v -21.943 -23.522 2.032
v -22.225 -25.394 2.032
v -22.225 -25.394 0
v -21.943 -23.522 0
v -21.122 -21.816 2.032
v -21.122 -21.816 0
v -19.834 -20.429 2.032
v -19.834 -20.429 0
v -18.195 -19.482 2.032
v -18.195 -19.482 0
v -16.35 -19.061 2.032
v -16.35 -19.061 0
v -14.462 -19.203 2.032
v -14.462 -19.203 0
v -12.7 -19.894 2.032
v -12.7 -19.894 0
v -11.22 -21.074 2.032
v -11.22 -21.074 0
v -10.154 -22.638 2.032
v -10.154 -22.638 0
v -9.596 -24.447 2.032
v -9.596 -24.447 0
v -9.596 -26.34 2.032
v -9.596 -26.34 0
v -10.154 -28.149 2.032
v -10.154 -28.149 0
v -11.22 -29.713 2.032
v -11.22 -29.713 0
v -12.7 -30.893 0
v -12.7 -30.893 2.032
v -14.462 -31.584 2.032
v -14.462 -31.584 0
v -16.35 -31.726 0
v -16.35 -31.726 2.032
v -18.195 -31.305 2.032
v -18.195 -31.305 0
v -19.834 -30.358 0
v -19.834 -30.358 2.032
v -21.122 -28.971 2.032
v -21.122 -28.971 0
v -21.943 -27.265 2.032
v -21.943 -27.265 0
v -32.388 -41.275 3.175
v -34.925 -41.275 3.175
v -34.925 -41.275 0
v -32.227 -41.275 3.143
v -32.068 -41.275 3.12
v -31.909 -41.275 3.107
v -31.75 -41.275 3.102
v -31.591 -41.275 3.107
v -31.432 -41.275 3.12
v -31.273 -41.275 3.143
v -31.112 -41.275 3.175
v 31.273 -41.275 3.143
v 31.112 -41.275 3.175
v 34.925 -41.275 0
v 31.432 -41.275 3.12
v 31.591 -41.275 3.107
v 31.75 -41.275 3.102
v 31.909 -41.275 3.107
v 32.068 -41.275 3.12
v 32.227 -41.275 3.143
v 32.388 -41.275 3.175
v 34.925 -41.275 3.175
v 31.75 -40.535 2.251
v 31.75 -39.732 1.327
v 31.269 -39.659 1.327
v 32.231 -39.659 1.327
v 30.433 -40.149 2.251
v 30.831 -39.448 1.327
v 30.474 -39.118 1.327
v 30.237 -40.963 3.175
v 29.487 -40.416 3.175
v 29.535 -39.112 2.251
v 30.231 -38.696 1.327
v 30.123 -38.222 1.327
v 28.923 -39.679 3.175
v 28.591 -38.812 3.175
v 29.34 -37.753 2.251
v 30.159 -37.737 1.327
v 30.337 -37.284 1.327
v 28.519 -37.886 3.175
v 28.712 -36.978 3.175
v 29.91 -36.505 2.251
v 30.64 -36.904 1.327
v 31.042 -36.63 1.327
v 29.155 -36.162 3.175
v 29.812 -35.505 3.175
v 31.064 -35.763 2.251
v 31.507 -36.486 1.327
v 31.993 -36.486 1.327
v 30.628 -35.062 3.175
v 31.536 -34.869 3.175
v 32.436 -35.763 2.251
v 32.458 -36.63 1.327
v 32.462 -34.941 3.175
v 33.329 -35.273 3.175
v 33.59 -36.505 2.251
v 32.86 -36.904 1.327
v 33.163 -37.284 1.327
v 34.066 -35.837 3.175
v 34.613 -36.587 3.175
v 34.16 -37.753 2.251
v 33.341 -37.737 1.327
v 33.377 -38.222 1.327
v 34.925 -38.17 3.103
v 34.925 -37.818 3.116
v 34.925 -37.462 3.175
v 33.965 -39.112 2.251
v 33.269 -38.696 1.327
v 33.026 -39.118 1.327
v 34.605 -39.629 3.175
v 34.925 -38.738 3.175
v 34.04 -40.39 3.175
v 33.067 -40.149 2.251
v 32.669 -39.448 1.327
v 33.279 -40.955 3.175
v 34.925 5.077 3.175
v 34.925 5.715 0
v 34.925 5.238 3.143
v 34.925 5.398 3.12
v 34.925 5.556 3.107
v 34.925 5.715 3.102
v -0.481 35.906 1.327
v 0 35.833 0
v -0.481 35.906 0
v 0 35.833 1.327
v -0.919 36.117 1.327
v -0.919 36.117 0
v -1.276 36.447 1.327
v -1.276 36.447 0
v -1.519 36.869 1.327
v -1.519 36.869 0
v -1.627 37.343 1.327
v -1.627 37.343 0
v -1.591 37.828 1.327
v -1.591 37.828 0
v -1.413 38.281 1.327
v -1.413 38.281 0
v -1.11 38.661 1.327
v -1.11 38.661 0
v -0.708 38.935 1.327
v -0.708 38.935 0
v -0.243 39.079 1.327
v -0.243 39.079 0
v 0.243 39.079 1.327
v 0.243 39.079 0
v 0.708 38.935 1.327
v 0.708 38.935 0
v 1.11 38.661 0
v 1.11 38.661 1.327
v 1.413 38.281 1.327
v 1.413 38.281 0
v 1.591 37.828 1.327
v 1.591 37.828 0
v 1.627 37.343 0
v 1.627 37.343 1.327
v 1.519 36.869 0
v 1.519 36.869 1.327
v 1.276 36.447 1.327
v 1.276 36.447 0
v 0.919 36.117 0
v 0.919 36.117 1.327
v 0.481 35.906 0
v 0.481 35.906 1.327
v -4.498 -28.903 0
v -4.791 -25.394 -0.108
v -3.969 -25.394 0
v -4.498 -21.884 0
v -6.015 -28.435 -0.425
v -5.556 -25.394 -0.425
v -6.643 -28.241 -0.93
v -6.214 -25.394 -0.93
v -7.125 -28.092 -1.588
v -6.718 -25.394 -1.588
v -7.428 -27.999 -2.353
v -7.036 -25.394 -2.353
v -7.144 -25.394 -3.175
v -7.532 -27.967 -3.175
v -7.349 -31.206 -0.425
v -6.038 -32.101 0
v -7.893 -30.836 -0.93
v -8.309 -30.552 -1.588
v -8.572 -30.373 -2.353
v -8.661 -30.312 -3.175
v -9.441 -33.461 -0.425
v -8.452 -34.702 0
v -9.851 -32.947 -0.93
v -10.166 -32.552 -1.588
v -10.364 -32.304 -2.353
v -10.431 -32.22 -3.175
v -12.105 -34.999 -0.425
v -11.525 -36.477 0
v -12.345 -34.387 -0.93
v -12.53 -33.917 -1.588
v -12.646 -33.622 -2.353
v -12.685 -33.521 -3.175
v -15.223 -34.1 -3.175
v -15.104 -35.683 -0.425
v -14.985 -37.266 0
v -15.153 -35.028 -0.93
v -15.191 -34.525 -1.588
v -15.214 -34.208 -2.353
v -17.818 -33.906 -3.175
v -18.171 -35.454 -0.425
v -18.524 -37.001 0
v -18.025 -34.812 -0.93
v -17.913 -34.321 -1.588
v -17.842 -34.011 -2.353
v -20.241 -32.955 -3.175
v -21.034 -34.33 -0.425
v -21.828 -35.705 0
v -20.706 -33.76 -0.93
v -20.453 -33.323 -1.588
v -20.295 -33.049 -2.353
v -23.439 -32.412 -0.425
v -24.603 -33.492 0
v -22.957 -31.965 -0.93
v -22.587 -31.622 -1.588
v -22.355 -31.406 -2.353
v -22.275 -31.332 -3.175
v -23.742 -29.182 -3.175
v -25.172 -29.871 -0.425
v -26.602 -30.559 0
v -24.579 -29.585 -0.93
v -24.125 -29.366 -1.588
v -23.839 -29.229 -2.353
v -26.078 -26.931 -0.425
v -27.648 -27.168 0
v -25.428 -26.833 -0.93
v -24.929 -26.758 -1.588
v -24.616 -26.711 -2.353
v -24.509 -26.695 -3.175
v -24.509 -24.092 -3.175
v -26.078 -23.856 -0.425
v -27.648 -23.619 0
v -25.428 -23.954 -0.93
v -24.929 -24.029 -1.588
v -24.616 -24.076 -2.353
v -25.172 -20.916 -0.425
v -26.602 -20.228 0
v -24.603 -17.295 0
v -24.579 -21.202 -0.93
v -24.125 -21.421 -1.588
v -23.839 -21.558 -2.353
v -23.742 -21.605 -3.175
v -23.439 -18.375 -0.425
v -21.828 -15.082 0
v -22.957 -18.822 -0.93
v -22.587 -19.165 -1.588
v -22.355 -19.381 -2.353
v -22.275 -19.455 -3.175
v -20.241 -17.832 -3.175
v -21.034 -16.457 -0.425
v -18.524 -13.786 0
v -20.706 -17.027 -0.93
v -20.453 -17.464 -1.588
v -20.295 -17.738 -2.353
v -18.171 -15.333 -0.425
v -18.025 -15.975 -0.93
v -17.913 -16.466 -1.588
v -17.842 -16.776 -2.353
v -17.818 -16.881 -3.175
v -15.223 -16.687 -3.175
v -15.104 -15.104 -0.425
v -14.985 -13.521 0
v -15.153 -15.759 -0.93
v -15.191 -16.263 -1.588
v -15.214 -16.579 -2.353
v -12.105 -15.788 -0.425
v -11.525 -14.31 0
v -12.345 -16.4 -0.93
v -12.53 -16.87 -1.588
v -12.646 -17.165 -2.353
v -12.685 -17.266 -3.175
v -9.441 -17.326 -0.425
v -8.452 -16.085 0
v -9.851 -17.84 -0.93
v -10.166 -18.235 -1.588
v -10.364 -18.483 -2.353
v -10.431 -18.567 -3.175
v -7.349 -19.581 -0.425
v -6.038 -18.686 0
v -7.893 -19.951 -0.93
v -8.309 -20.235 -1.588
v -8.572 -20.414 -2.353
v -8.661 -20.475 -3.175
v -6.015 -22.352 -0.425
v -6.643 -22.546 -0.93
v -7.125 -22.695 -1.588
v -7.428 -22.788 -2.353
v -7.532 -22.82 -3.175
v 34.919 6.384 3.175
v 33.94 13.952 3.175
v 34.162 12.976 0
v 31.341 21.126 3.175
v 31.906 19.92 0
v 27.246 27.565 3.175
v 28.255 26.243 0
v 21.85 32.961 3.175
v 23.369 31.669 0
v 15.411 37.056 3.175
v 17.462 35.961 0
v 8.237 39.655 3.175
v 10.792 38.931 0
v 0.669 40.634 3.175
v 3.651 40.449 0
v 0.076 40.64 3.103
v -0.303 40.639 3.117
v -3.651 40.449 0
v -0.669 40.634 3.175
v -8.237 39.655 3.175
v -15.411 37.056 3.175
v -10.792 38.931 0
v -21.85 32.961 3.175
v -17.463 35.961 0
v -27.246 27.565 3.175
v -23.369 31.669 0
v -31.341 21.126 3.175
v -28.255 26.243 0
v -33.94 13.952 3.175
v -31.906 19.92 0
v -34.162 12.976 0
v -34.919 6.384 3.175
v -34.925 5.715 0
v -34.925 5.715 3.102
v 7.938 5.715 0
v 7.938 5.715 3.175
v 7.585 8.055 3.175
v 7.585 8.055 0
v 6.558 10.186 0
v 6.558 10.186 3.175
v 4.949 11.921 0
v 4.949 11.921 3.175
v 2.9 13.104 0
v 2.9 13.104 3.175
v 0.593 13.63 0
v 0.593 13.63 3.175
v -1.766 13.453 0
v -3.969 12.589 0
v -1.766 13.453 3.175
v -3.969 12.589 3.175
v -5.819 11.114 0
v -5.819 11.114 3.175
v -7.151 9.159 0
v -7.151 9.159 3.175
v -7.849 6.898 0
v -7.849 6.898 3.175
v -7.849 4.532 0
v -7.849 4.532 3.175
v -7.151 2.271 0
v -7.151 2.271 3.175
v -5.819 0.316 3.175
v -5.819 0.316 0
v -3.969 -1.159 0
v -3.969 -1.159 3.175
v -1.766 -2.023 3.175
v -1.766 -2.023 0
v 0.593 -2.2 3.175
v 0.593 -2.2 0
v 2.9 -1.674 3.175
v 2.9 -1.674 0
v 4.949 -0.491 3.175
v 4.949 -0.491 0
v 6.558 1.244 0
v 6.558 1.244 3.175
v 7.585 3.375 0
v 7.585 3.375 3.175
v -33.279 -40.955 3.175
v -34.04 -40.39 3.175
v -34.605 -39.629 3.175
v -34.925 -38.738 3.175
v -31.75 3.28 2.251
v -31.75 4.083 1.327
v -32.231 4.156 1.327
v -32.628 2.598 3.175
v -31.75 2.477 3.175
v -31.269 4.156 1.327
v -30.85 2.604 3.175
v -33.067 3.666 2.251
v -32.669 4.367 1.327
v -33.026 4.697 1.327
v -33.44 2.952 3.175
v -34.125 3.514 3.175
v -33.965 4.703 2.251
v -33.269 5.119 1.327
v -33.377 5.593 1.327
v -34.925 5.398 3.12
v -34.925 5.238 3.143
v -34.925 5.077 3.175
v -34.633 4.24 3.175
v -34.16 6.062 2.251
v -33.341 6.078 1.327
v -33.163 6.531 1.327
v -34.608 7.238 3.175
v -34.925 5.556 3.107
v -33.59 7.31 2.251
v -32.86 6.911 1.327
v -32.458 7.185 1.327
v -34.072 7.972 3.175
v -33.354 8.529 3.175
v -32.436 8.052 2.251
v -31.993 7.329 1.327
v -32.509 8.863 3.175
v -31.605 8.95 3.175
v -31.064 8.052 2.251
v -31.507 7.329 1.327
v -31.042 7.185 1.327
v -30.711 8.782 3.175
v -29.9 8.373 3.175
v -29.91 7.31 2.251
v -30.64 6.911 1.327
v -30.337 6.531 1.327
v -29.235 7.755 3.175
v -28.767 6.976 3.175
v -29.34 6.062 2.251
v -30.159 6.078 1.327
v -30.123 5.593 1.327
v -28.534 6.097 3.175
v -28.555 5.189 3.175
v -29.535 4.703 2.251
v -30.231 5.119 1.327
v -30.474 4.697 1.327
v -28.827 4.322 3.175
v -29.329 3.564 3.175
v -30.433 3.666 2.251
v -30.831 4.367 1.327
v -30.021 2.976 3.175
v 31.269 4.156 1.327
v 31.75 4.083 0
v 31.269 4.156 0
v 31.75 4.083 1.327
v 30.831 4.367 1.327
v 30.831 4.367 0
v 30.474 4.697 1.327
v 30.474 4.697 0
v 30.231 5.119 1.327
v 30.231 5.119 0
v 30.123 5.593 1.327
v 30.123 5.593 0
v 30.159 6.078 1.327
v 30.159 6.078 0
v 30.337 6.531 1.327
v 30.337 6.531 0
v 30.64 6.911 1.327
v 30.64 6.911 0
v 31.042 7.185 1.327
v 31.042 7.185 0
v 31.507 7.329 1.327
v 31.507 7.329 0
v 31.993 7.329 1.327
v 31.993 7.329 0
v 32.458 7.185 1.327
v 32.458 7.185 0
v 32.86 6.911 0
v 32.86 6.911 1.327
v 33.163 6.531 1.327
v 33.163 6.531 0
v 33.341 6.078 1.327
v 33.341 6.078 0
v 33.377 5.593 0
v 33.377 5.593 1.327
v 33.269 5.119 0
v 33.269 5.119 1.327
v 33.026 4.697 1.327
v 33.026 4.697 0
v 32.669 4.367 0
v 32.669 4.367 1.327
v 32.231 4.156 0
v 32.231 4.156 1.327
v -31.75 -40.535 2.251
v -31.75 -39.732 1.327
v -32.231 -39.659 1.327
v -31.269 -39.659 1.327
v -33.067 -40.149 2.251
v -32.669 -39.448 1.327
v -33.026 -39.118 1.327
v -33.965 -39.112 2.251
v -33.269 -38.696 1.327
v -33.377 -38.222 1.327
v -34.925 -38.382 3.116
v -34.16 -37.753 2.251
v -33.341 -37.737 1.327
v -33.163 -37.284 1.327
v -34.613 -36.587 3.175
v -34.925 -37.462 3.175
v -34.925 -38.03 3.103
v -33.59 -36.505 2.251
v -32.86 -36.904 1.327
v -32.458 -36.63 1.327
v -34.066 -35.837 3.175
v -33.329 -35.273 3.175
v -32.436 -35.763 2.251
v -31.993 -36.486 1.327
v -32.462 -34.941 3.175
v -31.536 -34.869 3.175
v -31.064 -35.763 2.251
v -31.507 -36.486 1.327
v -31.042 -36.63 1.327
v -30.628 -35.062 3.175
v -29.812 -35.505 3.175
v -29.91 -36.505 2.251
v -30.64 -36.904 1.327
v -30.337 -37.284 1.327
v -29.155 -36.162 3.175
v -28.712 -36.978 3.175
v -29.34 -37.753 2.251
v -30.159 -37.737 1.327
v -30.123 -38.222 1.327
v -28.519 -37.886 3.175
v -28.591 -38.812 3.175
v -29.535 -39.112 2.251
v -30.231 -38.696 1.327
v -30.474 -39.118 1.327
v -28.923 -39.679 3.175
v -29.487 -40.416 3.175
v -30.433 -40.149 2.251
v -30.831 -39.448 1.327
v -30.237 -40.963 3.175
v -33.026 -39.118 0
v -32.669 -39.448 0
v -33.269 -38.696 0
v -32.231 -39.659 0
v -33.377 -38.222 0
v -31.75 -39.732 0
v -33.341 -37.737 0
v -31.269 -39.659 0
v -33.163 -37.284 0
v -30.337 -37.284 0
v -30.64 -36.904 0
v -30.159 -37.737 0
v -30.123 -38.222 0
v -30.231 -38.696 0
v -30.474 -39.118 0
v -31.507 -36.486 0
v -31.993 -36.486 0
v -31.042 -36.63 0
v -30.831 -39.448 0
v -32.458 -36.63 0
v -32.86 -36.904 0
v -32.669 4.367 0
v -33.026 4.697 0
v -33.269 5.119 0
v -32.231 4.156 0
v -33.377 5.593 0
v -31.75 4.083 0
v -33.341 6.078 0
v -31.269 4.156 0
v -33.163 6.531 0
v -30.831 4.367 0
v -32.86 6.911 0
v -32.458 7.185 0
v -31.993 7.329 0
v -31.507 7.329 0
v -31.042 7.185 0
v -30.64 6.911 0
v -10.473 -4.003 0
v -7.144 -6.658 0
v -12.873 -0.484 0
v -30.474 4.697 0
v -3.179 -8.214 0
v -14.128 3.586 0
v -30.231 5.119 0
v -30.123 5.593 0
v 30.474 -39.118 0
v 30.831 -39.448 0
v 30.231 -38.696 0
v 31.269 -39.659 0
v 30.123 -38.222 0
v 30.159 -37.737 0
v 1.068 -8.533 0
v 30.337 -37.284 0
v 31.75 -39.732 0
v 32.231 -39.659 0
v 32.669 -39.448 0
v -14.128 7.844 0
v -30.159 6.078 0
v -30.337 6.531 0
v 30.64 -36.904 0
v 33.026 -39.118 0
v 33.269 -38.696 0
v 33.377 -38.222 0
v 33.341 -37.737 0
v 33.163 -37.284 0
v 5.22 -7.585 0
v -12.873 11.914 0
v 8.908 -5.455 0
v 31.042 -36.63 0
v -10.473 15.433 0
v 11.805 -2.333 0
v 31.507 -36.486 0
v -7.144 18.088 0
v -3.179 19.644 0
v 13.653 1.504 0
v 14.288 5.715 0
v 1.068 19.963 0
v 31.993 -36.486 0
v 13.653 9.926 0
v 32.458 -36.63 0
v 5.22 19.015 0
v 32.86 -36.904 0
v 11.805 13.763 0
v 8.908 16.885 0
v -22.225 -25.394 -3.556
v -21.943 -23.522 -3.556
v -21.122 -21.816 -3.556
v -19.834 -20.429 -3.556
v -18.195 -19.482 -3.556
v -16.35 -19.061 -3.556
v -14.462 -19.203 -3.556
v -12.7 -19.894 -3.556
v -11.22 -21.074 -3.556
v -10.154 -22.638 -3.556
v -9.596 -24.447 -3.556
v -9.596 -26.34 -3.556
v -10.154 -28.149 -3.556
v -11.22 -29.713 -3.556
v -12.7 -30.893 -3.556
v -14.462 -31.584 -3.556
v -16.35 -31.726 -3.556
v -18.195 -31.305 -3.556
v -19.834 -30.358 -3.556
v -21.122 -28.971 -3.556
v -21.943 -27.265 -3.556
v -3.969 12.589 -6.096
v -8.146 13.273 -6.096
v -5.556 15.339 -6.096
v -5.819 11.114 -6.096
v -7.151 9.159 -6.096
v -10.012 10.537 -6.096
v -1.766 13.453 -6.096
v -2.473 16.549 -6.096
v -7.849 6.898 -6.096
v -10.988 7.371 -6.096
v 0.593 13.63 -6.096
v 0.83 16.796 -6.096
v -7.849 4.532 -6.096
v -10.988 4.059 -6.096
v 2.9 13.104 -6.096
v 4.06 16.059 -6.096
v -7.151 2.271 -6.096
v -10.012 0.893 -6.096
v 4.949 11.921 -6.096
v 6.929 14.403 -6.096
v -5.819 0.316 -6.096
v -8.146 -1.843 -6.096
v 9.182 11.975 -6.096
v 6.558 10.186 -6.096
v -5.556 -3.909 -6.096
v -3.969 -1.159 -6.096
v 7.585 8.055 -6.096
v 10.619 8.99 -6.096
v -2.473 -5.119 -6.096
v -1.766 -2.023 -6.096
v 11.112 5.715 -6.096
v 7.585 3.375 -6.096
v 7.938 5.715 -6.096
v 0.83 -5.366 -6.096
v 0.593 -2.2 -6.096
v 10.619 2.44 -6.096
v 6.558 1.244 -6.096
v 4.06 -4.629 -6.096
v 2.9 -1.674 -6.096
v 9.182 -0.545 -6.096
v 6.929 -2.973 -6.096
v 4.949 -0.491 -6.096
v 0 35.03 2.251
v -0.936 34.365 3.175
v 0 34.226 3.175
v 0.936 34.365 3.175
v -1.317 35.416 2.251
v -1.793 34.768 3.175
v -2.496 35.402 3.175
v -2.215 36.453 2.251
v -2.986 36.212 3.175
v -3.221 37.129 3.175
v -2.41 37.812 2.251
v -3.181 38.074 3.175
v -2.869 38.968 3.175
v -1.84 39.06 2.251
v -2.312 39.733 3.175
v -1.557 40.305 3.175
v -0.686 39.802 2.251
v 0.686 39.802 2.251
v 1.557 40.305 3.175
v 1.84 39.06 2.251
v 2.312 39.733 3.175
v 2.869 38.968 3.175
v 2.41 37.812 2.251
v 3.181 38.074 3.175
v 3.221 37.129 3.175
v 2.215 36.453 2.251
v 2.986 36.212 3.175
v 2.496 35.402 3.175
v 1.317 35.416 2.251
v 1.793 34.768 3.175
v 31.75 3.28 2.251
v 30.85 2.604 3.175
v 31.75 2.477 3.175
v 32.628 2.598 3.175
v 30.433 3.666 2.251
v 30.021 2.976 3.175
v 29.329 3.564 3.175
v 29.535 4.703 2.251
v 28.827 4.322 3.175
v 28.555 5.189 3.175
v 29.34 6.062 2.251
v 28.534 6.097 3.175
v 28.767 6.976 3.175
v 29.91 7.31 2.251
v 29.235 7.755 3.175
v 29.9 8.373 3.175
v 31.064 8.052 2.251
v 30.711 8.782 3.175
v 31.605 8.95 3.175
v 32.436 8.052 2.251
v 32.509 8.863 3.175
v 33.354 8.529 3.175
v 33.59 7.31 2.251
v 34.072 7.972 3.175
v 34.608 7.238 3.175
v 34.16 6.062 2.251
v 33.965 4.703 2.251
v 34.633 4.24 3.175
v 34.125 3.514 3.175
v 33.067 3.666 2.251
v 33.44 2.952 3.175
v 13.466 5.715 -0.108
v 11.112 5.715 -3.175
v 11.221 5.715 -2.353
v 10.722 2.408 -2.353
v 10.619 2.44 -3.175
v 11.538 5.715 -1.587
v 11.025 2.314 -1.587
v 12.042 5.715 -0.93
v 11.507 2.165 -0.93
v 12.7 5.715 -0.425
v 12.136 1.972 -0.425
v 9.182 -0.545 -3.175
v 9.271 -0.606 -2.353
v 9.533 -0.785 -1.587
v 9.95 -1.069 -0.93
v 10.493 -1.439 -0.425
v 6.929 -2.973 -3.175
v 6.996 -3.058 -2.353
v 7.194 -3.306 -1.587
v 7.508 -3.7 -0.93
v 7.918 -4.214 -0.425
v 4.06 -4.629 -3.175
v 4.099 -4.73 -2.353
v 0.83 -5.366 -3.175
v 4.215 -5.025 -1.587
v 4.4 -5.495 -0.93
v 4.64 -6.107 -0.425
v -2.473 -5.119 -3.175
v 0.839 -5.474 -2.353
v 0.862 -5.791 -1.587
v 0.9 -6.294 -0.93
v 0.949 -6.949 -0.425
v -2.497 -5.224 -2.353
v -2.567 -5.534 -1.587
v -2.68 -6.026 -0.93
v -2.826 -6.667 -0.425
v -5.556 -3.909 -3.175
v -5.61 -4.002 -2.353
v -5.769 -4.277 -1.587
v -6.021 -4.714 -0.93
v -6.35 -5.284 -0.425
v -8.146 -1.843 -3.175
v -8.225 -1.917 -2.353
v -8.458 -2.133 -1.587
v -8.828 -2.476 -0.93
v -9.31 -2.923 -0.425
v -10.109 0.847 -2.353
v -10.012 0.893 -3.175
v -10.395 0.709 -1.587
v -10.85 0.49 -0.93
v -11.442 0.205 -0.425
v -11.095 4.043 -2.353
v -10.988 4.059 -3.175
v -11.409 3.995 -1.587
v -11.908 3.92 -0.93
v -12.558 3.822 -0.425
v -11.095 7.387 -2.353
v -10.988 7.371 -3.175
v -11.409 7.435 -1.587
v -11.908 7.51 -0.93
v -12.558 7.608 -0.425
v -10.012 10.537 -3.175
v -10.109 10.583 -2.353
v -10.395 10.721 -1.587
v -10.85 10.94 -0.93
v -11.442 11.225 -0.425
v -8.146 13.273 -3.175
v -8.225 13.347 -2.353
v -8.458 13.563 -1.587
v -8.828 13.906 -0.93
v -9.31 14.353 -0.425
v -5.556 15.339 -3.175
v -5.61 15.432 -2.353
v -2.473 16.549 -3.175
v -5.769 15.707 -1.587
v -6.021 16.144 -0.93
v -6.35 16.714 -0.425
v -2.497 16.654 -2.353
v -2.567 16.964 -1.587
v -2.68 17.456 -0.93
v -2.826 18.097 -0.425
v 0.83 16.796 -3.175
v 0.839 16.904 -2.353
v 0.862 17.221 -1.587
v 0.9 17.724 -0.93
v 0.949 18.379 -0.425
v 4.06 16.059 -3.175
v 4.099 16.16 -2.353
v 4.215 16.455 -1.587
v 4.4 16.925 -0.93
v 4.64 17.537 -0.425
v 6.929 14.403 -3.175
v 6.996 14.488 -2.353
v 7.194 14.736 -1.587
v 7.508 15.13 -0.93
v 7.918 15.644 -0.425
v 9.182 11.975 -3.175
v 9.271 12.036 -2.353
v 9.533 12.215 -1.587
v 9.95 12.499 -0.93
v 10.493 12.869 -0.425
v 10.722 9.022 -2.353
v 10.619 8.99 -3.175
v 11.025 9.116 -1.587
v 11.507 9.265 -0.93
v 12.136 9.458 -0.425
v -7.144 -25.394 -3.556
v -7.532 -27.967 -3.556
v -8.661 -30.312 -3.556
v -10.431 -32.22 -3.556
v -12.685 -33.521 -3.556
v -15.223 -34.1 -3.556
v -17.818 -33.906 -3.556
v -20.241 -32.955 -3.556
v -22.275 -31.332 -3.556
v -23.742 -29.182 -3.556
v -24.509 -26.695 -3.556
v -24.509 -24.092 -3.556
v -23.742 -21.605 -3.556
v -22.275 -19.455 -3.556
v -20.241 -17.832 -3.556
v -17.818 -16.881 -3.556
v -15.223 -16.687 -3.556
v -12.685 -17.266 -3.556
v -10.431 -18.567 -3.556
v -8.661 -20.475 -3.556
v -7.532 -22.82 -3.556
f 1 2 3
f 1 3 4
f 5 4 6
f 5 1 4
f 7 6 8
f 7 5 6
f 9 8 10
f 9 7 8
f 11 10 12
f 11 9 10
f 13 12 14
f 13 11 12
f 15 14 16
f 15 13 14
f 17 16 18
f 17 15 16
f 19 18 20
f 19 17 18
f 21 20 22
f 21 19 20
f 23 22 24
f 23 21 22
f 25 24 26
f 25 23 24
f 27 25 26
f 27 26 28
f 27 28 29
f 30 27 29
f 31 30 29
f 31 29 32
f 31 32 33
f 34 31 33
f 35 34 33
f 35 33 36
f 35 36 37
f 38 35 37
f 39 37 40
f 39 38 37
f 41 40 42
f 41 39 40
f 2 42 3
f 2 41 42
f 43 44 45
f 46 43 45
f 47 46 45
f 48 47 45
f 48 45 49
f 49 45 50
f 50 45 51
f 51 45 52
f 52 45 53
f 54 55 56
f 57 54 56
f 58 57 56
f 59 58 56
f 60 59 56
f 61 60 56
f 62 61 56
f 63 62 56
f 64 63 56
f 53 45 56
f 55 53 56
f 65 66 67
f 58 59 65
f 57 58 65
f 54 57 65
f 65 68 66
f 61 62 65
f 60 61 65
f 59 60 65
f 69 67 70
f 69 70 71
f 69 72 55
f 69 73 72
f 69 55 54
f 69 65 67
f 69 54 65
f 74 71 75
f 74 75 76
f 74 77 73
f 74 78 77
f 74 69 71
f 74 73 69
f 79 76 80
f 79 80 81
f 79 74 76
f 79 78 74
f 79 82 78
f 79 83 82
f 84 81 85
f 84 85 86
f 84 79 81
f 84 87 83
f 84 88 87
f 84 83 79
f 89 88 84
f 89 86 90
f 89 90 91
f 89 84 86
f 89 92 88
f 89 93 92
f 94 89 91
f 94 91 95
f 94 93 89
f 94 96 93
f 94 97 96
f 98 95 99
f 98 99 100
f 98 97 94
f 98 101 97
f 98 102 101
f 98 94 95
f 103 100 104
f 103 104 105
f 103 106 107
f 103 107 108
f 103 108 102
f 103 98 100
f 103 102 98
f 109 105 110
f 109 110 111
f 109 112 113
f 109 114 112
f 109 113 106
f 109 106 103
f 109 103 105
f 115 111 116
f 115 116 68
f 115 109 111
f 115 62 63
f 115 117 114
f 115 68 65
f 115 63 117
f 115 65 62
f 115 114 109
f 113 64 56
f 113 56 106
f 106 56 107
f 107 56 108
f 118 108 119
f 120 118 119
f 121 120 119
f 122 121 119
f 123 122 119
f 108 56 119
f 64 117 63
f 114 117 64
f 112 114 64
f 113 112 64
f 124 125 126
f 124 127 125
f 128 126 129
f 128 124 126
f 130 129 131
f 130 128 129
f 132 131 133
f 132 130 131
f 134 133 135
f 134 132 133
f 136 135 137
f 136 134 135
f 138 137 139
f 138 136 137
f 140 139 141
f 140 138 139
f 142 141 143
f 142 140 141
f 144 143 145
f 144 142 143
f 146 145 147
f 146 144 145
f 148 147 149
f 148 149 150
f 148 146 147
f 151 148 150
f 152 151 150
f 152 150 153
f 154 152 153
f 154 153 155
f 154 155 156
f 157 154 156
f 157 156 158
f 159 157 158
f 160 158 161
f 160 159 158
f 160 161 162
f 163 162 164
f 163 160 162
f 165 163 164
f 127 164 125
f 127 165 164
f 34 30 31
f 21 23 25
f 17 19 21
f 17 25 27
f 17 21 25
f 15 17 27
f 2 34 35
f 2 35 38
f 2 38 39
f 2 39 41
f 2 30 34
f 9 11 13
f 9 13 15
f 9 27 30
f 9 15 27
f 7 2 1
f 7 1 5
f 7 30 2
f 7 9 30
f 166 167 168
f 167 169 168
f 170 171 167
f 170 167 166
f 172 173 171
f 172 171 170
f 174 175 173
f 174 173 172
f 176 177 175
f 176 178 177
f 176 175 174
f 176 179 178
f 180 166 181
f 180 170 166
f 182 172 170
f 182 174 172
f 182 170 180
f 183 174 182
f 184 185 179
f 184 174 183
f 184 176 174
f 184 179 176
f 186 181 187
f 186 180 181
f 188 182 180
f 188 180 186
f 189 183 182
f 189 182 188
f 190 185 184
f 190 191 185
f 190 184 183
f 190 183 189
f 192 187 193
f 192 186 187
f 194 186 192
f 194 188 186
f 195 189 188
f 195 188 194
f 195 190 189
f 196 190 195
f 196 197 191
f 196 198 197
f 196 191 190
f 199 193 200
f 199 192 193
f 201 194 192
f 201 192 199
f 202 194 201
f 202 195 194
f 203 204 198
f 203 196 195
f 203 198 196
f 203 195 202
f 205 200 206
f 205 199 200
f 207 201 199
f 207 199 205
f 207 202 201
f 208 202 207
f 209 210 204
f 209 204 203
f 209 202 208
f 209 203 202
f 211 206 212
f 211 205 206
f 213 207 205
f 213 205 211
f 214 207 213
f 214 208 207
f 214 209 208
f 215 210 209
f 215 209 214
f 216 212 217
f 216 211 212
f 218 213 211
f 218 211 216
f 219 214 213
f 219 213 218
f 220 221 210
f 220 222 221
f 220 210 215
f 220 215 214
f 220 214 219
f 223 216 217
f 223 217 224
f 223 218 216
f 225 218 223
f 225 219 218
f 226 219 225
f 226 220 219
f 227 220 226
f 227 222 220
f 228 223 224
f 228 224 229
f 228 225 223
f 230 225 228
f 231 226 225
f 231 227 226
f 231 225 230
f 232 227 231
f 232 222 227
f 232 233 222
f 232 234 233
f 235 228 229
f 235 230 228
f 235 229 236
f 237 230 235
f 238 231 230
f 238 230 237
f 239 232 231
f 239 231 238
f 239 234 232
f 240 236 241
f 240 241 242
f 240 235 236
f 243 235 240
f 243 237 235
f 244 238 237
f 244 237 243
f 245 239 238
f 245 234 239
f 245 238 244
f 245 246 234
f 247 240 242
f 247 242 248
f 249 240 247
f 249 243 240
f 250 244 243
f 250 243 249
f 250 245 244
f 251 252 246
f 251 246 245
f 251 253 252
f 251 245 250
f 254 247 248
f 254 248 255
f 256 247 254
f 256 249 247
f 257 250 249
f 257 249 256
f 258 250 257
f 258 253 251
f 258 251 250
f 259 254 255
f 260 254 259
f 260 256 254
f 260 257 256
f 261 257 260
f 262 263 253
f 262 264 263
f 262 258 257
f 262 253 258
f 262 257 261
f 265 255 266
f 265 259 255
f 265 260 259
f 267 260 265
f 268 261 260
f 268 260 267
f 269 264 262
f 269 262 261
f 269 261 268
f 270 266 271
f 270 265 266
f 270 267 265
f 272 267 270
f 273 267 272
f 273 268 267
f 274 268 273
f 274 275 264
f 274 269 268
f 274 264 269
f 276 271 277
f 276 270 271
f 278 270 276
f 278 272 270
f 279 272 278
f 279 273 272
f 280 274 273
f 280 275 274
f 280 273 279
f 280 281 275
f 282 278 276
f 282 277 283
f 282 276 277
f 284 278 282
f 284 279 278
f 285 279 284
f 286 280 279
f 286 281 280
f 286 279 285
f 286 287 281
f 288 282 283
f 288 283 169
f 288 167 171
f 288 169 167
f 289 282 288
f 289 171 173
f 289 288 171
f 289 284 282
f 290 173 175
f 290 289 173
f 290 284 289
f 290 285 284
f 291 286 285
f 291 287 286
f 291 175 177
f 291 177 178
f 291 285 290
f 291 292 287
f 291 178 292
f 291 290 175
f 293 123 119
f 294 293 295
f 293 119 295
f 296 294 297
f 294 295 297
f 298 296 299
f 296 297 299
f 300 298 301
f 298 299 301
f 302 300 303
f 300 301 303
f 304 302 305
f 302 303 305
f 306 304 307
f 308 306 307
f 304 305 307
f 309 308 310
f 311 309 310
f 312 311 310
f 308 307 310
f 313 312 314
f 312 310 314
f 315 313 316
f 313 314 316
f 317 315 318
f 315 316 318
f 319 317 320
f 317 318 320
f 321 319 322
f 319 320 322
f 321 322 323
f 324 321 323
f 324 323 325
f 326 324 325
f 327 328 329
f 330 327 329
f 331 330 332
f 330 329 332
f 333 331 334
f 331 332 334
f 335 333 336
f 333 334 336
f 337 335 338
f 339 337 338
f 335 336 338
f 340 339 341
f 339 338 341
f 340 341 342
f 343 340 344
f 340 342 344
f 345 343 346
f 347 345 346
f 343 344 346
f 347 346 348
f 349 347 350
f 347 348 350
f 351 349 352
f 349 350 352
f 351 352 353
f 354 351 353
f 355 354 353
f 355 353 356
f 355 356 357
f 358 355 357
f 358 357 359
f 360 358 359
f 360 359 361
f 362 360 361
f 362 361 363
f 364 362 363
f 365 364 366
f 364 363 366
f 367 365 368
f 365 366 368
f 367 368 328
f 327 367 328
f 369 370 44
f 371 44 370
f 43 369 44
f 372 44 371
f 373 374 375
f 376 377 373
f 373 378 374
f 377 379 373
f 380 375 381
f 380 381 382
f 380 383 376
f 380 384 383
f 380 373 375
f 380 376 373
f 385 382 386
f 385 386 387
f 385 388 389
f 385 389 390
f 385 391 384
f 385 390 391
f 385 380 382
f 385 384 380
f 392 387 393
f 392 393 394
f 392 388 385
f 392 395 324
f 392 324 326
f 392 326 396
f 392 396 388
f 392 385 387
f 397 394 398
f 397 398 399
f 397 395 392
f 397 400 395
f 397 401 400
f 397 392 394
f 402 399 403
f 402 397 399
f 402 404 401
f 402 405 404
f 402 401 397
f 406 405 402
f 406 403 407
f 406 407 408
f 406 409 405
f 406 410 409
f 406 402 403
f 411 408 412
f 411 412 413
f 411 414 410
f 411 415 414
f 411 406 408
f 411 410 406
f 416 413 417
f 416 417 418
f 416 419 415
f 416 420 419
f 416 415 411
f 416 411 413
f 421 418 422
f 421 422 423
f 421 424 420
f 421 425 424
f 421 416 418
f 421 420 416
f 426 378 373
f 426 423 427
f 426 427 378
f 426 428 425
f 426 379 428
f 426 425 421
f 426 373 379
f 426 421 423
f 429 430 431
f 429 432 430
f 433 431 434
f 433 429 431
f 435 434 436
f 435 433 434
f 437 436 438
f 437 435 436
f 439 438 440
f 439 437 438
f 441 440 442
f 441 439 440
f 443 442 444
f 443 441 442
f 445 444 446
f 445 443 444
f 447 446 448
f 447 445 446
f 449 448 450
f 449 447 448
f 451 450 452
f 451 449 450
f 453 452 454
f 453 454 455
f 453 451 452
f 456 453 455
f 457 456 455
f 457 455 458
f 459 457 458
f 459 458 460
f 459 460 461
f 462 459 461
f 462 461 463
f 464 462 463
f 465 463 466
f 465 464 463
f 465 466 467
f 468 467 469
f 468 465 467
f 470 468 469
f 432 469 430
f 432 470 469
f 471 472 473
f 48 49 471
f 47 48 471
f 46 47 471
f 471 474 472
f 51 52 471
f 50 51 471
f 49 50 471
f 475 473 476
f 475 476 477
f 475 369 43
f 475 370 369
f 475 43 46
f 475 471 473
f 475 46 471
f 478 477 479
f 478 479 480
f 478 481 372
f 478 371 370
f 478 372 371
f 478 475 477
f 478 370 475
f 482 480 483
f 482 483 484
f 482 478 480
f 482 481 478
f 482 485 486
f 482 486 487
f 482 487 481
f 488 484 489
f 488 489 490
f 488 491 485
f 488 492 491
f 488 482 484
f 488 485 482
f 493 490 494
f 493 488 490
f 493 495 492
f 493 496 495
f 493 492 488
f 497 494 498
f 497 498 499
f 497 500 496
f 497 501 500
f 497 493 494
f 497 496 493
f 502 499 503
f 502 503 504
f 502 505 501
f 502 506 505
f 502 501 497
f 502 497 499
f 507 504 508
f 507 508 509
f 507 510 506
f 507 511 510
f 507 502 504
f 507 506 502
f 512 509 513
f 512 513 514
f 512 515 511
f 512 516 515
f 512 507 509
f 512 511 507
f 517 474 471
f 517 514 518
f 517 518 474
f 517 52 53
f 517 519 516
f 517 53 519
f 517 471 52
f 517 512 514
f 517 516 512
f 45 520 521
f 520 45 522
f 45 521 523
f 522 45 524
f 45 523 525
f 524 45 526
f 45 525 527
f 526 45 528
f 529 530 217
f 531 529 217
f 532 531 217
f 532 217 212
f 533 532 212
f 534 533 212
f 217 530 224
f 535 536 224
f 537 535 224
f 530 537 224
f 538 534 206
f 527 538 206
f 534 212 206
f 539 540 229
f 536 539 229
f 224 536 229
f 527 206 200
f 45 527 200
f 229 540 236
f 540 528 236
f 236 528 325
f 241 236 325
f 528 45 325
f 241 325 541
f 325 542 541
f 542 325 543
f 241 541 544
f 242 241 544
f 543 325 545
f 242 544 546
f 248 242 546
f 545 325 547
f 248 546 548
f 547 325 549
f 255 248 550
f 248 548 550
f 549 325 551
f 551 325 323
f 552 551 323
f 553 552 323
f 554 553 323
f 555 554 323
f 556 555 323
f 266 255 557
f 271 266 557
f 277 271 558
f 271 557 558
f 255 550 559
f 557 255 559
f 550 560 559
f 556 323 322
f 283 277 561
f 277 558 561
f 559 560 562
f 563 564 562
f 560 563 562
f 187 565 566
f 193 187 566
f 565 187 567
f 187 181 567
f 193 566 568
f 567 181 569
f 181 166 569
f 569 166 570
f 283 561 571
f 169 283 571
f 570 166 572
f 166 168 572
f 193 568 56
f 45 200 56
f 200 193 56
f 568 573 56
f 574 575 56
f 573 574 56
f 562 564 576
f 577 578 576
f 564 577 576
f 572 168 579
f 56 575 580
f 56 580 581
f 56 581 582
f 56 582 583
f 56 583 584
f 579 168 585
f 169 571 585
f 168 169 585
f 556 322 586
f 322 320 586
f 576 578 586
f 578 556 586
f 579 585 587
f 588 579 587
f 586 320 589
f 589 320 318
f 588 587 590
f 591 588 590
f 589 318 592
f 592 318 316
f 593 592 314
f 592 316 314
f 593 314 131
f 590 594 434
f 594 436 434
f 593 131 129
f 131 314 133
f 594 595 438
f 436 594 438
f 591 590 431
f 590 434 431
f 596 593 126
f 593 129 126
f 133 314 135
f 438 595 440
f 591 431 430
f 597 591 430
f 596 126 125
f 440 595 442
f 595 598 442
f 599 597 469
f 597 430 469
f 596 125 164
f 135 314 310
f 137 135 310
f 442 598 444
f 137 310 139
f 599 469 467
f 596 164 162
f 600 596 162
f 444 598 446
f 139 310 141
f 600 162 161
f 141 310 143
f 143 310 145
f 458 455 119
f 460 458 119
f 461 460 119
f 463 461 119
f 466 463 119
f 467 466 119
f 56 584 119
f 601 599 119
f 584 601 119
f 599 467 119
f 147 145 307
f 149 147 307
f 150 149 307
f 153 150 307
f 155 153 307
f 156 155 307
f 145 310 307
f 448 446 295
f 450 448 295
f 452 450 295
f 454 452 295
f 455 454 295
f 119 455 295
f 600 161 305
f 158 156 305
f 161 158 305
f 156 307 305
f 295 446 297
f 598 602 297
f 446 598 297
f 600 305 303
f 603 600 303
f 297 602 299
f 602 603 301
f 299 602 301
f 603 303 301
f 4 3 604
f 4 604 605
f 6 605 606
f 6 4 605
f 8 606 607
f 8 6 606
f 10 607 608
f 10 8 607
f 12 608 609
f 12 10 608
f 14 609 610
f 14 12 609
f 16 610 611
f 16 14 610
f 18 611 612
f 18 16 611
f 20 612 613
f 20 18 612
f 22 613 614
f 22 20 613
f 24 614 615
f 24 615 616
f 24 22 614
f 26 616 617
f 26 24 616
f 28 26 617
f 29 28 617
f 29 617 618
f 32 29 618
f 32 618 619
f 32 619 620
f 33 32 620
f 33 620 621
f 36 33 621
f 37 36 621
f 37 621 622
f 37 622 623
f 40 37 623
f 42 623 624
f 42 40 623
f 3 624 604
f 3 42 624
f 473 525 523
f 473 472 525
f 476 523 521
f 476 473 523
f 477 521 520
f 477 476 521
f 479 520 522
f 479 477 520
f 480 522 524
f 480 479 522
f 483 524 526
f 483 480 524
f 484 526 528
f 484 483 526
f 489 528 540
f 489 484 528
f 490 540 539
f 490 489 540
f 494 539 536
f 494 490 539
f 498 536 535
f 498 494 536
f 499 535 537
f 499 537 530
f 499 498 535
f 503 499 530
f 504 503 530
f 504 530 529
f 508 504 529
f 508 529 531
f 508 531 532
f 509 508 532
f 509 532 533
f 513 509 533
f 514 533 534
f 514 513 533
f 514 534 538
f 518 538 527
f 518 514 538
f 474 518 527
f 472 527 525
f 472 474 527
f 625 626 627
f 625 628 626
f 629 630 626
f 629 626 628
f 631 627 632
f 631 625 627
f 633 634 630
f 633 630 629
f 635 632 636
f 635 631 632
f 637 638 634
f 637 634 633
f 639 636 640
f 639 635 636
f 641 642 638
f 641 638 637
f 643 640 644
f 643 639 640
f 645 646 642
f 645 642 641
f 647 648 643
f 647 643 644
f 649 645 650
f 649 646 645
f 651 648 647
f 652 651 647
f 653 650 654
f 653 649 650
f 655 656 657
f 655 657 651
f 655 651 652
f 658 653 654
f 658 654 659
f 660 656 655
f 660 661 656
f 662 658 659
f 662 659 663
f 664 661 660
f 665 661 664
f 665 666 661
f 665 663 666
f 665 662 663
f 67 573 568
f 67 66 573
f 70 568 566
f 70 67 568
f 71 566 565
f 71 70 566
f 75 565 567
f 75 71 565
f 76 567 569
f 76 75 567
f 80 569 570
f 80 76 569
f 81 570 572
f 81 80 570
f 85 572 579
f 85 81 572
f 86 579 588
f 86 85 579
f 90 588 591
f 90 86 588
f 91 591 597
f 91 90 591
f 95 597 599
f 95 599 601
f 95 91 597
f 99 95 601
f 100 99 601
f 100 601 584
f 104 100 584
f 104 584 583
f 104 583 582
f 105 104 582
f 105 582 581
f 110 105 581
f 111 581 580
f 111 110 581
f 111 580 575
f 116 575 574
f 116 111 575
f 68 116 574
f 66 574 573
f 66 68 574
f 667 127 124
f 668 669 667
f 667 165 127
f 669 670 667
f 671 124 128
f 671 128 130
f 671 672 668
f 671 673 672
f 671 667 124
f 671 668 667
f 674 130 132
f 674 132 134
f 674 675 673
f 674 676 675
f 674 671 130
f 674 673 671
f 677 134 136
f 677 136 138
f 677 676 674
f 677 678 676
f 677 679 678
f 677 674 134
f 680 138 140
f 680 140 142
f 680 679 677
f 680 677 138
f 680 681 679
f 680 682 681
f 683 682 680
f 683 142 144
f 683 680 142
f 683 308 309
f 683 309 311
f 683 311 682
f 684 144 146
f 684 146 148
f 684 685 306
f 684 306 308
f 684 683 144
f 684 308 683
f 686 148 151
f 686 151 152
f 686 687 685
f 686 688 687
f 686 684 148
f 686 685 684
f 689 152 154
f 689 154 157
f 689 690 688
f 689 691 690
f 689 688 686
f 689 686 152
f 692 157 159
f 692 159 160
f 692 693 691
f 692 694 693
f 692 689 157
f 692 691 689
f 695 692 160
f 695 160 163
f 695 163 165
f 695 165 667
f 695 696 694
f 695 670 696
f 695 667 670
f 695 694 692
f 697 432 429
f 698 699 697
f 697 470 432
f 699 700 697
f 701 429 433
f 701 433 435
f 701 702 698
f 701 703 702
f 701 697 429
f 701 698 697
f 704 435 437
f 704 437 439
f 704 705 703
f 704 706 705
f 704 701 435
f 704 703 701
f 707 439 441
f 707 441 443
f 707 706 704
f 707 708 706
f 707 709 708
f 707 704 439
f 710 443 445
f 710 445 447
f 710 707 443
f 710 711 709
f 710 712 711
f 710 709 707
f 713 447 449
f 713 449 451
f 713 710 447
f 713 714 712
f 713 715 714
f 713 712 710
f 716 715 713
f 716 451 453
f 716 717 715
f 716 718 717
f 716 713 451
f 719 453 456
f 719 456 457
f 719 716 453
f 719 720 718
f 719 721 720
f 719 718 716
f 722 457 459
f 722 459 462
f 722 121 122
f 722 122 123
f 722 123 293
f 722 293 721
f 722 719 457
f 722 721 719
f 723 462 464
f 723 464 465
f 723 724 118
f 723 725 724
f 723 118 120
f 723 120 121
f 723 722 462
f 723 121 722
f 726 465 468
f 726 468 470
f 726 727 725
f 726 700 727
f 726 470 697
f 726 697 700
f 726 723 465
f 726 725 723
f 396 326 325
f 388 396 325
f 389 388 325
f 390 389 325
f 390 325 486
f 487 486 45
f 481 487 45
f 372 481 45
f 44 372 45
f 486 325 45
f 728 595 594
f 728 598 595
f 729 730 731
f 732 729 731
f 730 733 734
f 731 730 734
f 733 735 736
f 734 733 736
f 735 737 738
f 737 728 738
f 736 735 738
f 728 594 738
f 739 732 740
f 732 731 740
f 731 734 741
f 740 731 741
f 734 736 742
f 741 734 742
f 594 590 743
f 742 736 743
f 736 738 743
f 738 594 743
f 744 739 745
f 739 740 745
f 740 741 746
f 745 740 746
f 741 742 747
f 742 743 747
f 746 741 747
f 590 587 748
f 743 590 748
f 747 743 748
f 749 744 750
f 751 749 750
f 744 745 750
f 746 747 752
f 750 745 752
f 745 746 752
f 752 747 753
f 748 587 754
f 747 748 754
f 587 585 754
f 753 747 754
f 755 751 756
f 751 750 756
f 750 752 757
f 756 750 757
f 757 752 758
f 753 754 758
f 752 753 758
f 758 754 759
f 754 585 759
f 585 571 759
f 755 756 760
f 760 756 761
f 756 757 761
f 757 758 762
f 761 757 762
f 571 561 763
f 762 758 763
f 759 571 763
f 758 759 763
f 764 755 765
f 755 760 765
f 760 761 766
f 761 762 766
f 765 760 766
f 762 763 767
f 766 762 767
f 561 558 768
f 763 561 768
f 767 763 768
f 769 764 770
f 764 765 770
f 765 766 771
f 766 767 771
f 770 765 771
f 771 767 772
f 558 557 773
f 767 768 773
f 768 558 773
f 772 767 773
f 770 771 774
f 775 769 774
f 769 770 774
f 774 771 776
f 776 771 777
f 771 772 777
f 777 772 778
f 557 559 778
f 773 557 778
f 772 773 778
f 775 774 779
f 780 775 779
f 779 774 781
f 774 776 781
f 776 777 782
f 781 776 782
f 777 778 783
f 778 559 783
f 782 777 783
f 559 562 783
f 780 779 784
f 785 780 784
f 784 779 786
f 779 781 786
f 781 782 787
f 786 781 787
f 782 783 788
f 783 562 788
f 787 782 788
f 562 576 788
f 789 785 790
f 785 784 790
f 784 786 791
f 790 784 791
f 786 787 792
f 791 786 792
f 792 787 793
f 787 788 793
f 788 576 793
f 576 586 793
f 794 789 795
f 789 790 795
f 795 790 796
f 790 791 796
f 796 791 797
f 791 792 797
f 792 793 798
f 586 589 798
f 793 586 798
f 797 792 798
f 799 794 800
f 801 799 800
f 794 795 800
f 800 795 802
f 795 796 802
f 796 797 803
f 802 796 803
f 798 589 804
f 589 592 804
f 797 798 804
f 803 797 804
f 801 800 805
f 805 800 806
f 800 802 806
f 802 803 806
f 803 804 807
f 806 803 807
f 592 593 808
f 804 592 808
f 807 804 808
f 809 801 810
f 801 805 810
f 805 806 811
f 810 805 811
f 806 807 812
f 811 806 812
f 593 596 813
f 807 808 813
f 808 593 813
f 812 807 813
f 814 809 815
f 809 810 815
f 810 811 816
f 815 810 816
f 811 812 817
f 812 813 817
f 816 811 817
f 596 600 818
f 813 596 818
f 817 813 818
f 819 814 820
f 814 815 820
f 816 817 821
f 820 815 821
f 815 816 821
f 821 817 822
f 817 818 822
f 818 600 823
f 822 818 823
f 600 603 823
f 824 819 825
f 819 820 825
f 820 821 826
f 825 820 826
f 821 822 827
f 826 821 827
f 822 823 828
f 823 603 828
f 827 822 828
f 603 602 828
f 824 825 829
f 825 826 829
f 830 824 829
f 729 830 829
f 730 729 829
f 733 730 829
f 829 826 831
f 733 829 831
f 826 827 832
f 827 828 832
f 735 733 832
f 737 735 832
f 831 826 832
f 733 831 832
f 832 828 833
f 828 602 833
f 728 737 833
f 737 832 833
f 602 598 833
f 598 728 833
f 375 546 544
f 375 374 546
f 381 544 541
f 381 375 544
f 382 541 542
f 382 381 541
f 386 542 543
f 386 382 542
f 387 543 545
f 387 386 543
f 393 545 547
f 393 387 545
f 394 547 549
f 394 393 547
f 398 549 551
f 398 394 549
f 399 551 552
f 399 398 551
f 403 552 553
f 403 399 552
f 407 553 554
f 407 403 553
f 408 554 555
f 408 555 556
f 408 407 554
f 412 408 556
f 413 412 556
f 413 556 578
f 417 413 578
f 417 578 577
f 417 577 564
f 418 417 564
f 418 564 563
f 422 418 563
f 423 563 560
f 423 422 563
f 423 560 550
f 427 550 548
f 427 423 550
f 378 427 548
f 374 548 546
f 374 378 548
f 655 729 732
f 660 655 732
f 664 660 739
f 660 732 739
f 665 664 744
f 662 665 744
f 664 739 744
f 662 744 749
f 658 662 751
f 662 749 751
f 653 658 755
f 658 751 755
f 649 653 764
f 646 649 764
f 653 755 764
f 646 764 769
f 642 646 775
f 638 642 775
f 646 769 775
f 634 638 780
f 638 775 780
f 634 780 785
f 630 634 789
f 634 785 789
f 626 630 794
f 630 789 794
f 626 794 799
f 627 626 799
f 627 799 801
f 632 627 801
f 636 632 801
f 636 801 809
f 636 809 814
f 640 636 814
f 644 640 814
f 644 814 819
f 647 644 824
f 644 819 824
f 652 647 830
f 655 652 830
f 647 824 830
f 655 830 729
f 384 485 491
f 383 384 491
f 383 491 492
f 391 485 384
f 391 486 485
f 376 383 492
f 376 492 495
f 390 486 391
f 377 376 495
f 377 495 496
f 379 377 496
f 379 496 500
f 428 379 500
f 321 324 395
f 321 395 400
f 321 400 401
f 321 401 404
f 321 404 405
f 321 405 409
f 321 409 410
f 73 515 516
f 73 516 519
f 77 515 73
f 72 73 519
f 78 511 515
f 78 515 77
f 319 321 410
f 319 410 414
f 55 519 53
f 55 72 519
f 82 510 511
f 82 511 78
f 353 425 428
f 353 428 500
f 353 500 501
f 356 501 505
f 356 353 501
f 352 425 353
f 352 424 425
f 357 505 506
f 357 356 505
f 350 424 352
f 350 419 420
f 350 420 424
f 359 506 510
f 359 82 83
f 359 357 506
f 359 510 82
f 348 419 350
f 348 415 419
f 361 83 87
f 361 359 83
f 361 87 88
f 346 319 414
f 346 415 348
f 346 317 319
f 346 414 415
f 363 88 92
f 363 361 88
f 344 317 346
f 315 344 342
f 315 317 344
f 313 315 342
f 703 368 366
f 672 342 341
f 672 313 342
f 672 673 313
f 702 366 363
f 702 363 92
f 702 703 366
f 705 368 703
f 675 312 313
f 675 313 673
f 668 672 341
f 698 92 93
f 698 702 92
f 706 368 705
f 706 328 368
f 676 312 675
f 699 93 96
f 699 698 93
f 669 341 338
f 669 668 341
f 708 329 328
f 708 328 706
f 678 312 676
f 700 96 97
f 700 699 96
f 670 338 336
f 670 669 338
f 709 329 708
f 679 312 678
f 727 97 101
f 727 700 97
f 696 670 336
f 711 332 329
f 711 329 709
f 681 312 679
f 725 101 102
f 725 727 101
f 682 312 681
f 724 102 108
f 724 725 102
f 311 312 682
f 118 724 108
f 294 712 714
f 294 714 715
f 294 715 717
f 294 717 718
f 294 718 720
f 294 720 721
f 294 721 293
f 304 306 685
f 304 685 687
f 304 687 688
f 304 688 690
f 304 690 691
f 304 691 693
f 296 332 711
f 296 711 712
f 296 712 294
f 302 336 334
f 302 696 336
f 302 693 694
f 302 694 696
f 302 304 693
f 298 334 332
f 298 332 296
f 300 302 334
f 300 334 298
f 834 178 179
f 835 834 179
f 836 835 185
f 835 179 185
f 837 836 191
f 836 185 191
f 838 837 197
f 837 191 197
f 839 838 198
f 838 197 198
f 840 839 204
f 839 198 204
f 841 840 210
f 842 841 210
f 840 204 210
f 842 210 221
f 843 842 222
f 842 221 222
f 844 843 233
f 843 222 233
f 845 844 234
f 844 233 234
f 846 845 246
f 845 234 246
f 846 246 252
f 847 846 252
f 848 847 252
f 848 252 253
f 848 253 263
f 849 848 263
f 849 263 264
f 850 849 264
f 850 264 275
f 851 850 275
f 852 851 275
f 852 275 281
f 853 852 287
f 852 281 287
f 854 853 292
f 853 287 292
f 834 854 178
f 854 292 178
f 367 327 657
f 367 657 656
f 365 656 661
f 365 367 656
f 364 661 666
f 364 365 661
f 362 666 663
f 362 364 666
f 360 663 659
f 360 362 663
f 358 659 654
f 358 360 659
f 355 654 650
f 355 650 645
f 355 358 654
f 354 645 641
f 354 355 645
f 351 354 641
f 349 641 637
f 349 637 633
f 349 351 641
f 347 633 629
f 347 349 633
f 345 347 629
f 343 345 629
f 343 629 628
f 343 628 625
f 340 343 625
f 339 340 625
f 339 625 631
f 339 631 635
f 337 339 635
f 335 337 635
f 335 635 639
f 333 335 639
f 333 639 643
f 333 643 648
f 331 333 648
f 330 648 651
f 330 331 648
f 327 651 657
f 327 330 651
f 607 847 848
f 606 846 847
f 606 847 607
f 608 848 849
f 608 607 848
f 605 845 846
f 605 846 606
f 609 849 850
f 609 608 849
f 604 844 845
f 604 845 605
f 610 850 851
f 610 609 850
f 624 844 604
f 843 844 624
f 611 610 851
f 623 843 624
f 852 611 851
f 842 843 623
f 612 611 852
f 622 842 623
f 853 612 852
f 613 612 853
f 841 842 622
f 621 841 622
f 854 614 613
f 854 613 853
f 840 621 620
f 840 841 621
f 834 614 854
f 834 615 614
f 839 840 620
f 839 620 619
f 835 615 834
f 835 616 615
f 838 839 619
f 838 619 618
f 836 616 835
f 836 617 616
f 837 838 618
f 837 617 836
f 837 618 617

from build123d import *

# Parameters (mm, degrees)
BOSS_EXTRUDE1_DEPTH                           = 3.175
SKETCH2_R                                     = 7.9375
CUT_EXTRUDE1_DEPTH                            = 3.175
CSK_FOR_4_FLAT_HEAD_SOCKET_CAP_SCREW1_A_COUNT = 2
CSK_FOR_4_FLAT_HEAD_SOCKET_CAP_SCREW1_A_PITCH = 44.901280605
CSK_FOR_4_FLAT_HEAD_SOCKET_CAP_SCRE_2_COUNT   = 2
CSK_FOR_4_FLAT_HEAD_SOCKET_CAP_SCRE_2_PITCH   = 44.901280605
CSK_FOR_4_FLAT_HEAD_SOCKET_CAP_SCRE_3_COUNT   = 2
CSK_FOR_4_FLAT_HEAD_SOCKET_CAP_SCRE_3_PITCH   = 81.964210025
CSK_FOR_4_FLAT_HEAD_SOCKET_CAP_SCRE_4_COUNT   = 2
CSK_FOR_4_FLAT_HEAD_SOCKET_CAP_SCRE_4_PITCH   = 81.964210025
SKETCH6_R                                     = 11.1125
SKETCH6_R_2                                   = 7.9375
BOSS_EXTRUDE2_DEPTH                           = 6.096
SKETCH7_R                                     = 8.73125
SKETCH7_R_2                                   = 6.35
BOSS_EXTRUDE3_DEPTH                           = 3.556
CUT_EXTRUDE2_START                            = -2.032
SKETCH8_R                                     = 6.35
CUT_EXTRUDE2_DEPTH                            = 2.032
FILLET1_R                                     = 3.175


with BuildPart() as part:
    # Sketch1 → Boss-Extrude1 (new body)
    with BuildSketch(Plane.XY):
        with BuildLine():
            Line((-34.925, 5.715), (-34.925, -41.275))
            Line((-34.925, -41.275), (34.925, -41.275))
            Line((34.925, -41.275), (34.925, 5.715))
            ThreePointArc((34.925, 5.715), (0, 40.64), (-34.925, 5.715))
        make_face()
    extrude(amount=BOSS_EXTRUDE1_DEPTH)

    # Sketch2 → Cut-Extrude1 (cut)
    with BuildSketch(Plane.XY.offset(3.175)):
        with Locations((0, 5.715)):
            Circle(SKETCH2_R)
    extrude(amount=-CUT_EXTRUDE1_DEPTH, mode=Mode.SUBTRACT)

    # Sketch5 → CSK for #4 Flat Head Socket Cap Screw1 (revolve, cut)
    with BuildSketch(Plane(origin=(0, 37.465, 3.175), x_dir=(0, -1, 0), z_dir=(1, 0, 0))):
        Polygon((0, 0), (0, 3.175), (1.63195, 3.175), (1.63195, 1.848124365), (3.2385, 0), align=None)
    csk_for_4_flat_head_socket_cap_screw1 = revolve(axis=Axis((0, 37.465, 9.525), (0, 0, -1)), mode=Mode.SUBTRACT)

    # CSK for #4 Flat Head Socket Cap Screw1 a: CSK for #4 Flat Head Socket Cap Screw1 ×2
    with Locations(*[Vector(-0.7071067811865475, -0.7071067811865476, 0) * (i * CSK_FOR_4_FLAT_HEAD_SOCKET_CAP_SCREW1_A_PITCH) for i in range(1, CSK_FOR_4_FLAT_HEAD_SOCKET_CAP_SCREW1_A_COUNT)]):
        add(csk_for_4_flat_head_socket_cap_screw1, mode=Mode.SUBTRACT)

    # CSK for _4 Flat Head Socket Cap Scre 2: CSK for #4 Flat Head Socket Cap Screw1 ×2
    with Locations(*[Vector(0.7071067811865475, -0.7071067811865477, 0) * (i * CSK_FOR_4_FLAT_HEAD_SOCKET_CAP_SCRE_2_PITCH) for i in range(1, CSK_FOR_4_FLAT_HEAD_SOCKET_CAP_SCRE_2_COUNT)]):
        add(csk_for_4_flat_head_socket_cap_screw1, mode=Mode.SUBTRACT)

    # CSK for _4 Flat Head Socket Cap Scre 3: CSK for #4 Flat Head Socket Cap Screw1 ×2
    with Locations(*[Vector(0.3873641921317683, -0.9219267772736089, 0) * (i * CSK_FOR_4_FLAT_HEAD_SOCKET_CAP_SCRE_3_PITCH) for i in range(1, CSK_FOR_4_FLAT_HEAD_SOCKET_CAP_SCRE_3_COUNT)]):
        add(csk_for_4_flat_head_socket_cap_screw1, mode=Mode.SUBTRACT)

    # CSK for _4 Flat Head Socket Cap Scre 4: CSK for #4 Flat Head Socket Cap Screw1 ×2
    with Locations(*[Vector(-0.3873641921317683, -0.9219267772736089, 0) * (i * CSK_FOR_4_FLAT_HEAD_SOCKET_CAP_SCRE_4_PITCH) for i in range(1, CSK_FOR_4_FLAT_HEAD_SOCKET_CAP_SCRE_4_COUNT)]):
        add(csk_for_4_flat_head_socket_cap_screw1, mode=Mode.SUBTRACT)

    # Sketch6 → Boss-Extrude2 (add)
    with BuildSketch(Plane(origin=(0, 0, 0), x_dir=(-1, 0, 0), z_dir=(0, 0, -1))):
        with Locations(Location((0, 5.715, 0), (0, 0, 180))):
            Circle(SKETCH6_R)
        with Locations(Location((0, 5.715, 0), (0, 0, 180))):
            Circle(SKETCH6_R_2, mode=Mode.SUBTRACT)
    extrude(amount=BOSS_EXTRUDE2_DEPTH)

    # Sketch7 → Boss-Extrude3 (add)
    with BuildSketch(Plane(origin=(0, 0, 0), x_dir=(-1, 0, 0), z_dir=(0, 0, -1))):
        with Locations(Location((15.875, -25.393519733, 0), (0, 0, 180))):
            Circle(SKETCH7_R)
        with Locations((15.875, -25.393519733)):
            Circle(SKETCH7_R_2, mode=Mode.SUBTRACT)
    extrude(amount=BOSS_EXTRUDE3_DEPTH)

    # Sketch8 → Cut-Extrude2 (cut)
    with BuildSketch(Plane(origin=(0, 0, 0), x_dir=(-1, 0, 0), z_dir=(0, 0, -1)).offset(CUT_EXTRUDE2_START)):
        with Locations((15.875, -25.393519733)):
            Circle(SKETCH8_R)
    extrude(amount=CUT_EXTRUDE2_DEPTH, mode=Mode.SUBTRACT)

    # Fillet1
    fillet1_edges = [part.edges().sort_by_distance(p)[0] for p in [
        (-11.1125, 5.715, 0),
        (-24.60625, -25.393519733, 0),
    ]]
    fillet(fillet1_edges, radius=FILLET1_R)


solid = part.part
